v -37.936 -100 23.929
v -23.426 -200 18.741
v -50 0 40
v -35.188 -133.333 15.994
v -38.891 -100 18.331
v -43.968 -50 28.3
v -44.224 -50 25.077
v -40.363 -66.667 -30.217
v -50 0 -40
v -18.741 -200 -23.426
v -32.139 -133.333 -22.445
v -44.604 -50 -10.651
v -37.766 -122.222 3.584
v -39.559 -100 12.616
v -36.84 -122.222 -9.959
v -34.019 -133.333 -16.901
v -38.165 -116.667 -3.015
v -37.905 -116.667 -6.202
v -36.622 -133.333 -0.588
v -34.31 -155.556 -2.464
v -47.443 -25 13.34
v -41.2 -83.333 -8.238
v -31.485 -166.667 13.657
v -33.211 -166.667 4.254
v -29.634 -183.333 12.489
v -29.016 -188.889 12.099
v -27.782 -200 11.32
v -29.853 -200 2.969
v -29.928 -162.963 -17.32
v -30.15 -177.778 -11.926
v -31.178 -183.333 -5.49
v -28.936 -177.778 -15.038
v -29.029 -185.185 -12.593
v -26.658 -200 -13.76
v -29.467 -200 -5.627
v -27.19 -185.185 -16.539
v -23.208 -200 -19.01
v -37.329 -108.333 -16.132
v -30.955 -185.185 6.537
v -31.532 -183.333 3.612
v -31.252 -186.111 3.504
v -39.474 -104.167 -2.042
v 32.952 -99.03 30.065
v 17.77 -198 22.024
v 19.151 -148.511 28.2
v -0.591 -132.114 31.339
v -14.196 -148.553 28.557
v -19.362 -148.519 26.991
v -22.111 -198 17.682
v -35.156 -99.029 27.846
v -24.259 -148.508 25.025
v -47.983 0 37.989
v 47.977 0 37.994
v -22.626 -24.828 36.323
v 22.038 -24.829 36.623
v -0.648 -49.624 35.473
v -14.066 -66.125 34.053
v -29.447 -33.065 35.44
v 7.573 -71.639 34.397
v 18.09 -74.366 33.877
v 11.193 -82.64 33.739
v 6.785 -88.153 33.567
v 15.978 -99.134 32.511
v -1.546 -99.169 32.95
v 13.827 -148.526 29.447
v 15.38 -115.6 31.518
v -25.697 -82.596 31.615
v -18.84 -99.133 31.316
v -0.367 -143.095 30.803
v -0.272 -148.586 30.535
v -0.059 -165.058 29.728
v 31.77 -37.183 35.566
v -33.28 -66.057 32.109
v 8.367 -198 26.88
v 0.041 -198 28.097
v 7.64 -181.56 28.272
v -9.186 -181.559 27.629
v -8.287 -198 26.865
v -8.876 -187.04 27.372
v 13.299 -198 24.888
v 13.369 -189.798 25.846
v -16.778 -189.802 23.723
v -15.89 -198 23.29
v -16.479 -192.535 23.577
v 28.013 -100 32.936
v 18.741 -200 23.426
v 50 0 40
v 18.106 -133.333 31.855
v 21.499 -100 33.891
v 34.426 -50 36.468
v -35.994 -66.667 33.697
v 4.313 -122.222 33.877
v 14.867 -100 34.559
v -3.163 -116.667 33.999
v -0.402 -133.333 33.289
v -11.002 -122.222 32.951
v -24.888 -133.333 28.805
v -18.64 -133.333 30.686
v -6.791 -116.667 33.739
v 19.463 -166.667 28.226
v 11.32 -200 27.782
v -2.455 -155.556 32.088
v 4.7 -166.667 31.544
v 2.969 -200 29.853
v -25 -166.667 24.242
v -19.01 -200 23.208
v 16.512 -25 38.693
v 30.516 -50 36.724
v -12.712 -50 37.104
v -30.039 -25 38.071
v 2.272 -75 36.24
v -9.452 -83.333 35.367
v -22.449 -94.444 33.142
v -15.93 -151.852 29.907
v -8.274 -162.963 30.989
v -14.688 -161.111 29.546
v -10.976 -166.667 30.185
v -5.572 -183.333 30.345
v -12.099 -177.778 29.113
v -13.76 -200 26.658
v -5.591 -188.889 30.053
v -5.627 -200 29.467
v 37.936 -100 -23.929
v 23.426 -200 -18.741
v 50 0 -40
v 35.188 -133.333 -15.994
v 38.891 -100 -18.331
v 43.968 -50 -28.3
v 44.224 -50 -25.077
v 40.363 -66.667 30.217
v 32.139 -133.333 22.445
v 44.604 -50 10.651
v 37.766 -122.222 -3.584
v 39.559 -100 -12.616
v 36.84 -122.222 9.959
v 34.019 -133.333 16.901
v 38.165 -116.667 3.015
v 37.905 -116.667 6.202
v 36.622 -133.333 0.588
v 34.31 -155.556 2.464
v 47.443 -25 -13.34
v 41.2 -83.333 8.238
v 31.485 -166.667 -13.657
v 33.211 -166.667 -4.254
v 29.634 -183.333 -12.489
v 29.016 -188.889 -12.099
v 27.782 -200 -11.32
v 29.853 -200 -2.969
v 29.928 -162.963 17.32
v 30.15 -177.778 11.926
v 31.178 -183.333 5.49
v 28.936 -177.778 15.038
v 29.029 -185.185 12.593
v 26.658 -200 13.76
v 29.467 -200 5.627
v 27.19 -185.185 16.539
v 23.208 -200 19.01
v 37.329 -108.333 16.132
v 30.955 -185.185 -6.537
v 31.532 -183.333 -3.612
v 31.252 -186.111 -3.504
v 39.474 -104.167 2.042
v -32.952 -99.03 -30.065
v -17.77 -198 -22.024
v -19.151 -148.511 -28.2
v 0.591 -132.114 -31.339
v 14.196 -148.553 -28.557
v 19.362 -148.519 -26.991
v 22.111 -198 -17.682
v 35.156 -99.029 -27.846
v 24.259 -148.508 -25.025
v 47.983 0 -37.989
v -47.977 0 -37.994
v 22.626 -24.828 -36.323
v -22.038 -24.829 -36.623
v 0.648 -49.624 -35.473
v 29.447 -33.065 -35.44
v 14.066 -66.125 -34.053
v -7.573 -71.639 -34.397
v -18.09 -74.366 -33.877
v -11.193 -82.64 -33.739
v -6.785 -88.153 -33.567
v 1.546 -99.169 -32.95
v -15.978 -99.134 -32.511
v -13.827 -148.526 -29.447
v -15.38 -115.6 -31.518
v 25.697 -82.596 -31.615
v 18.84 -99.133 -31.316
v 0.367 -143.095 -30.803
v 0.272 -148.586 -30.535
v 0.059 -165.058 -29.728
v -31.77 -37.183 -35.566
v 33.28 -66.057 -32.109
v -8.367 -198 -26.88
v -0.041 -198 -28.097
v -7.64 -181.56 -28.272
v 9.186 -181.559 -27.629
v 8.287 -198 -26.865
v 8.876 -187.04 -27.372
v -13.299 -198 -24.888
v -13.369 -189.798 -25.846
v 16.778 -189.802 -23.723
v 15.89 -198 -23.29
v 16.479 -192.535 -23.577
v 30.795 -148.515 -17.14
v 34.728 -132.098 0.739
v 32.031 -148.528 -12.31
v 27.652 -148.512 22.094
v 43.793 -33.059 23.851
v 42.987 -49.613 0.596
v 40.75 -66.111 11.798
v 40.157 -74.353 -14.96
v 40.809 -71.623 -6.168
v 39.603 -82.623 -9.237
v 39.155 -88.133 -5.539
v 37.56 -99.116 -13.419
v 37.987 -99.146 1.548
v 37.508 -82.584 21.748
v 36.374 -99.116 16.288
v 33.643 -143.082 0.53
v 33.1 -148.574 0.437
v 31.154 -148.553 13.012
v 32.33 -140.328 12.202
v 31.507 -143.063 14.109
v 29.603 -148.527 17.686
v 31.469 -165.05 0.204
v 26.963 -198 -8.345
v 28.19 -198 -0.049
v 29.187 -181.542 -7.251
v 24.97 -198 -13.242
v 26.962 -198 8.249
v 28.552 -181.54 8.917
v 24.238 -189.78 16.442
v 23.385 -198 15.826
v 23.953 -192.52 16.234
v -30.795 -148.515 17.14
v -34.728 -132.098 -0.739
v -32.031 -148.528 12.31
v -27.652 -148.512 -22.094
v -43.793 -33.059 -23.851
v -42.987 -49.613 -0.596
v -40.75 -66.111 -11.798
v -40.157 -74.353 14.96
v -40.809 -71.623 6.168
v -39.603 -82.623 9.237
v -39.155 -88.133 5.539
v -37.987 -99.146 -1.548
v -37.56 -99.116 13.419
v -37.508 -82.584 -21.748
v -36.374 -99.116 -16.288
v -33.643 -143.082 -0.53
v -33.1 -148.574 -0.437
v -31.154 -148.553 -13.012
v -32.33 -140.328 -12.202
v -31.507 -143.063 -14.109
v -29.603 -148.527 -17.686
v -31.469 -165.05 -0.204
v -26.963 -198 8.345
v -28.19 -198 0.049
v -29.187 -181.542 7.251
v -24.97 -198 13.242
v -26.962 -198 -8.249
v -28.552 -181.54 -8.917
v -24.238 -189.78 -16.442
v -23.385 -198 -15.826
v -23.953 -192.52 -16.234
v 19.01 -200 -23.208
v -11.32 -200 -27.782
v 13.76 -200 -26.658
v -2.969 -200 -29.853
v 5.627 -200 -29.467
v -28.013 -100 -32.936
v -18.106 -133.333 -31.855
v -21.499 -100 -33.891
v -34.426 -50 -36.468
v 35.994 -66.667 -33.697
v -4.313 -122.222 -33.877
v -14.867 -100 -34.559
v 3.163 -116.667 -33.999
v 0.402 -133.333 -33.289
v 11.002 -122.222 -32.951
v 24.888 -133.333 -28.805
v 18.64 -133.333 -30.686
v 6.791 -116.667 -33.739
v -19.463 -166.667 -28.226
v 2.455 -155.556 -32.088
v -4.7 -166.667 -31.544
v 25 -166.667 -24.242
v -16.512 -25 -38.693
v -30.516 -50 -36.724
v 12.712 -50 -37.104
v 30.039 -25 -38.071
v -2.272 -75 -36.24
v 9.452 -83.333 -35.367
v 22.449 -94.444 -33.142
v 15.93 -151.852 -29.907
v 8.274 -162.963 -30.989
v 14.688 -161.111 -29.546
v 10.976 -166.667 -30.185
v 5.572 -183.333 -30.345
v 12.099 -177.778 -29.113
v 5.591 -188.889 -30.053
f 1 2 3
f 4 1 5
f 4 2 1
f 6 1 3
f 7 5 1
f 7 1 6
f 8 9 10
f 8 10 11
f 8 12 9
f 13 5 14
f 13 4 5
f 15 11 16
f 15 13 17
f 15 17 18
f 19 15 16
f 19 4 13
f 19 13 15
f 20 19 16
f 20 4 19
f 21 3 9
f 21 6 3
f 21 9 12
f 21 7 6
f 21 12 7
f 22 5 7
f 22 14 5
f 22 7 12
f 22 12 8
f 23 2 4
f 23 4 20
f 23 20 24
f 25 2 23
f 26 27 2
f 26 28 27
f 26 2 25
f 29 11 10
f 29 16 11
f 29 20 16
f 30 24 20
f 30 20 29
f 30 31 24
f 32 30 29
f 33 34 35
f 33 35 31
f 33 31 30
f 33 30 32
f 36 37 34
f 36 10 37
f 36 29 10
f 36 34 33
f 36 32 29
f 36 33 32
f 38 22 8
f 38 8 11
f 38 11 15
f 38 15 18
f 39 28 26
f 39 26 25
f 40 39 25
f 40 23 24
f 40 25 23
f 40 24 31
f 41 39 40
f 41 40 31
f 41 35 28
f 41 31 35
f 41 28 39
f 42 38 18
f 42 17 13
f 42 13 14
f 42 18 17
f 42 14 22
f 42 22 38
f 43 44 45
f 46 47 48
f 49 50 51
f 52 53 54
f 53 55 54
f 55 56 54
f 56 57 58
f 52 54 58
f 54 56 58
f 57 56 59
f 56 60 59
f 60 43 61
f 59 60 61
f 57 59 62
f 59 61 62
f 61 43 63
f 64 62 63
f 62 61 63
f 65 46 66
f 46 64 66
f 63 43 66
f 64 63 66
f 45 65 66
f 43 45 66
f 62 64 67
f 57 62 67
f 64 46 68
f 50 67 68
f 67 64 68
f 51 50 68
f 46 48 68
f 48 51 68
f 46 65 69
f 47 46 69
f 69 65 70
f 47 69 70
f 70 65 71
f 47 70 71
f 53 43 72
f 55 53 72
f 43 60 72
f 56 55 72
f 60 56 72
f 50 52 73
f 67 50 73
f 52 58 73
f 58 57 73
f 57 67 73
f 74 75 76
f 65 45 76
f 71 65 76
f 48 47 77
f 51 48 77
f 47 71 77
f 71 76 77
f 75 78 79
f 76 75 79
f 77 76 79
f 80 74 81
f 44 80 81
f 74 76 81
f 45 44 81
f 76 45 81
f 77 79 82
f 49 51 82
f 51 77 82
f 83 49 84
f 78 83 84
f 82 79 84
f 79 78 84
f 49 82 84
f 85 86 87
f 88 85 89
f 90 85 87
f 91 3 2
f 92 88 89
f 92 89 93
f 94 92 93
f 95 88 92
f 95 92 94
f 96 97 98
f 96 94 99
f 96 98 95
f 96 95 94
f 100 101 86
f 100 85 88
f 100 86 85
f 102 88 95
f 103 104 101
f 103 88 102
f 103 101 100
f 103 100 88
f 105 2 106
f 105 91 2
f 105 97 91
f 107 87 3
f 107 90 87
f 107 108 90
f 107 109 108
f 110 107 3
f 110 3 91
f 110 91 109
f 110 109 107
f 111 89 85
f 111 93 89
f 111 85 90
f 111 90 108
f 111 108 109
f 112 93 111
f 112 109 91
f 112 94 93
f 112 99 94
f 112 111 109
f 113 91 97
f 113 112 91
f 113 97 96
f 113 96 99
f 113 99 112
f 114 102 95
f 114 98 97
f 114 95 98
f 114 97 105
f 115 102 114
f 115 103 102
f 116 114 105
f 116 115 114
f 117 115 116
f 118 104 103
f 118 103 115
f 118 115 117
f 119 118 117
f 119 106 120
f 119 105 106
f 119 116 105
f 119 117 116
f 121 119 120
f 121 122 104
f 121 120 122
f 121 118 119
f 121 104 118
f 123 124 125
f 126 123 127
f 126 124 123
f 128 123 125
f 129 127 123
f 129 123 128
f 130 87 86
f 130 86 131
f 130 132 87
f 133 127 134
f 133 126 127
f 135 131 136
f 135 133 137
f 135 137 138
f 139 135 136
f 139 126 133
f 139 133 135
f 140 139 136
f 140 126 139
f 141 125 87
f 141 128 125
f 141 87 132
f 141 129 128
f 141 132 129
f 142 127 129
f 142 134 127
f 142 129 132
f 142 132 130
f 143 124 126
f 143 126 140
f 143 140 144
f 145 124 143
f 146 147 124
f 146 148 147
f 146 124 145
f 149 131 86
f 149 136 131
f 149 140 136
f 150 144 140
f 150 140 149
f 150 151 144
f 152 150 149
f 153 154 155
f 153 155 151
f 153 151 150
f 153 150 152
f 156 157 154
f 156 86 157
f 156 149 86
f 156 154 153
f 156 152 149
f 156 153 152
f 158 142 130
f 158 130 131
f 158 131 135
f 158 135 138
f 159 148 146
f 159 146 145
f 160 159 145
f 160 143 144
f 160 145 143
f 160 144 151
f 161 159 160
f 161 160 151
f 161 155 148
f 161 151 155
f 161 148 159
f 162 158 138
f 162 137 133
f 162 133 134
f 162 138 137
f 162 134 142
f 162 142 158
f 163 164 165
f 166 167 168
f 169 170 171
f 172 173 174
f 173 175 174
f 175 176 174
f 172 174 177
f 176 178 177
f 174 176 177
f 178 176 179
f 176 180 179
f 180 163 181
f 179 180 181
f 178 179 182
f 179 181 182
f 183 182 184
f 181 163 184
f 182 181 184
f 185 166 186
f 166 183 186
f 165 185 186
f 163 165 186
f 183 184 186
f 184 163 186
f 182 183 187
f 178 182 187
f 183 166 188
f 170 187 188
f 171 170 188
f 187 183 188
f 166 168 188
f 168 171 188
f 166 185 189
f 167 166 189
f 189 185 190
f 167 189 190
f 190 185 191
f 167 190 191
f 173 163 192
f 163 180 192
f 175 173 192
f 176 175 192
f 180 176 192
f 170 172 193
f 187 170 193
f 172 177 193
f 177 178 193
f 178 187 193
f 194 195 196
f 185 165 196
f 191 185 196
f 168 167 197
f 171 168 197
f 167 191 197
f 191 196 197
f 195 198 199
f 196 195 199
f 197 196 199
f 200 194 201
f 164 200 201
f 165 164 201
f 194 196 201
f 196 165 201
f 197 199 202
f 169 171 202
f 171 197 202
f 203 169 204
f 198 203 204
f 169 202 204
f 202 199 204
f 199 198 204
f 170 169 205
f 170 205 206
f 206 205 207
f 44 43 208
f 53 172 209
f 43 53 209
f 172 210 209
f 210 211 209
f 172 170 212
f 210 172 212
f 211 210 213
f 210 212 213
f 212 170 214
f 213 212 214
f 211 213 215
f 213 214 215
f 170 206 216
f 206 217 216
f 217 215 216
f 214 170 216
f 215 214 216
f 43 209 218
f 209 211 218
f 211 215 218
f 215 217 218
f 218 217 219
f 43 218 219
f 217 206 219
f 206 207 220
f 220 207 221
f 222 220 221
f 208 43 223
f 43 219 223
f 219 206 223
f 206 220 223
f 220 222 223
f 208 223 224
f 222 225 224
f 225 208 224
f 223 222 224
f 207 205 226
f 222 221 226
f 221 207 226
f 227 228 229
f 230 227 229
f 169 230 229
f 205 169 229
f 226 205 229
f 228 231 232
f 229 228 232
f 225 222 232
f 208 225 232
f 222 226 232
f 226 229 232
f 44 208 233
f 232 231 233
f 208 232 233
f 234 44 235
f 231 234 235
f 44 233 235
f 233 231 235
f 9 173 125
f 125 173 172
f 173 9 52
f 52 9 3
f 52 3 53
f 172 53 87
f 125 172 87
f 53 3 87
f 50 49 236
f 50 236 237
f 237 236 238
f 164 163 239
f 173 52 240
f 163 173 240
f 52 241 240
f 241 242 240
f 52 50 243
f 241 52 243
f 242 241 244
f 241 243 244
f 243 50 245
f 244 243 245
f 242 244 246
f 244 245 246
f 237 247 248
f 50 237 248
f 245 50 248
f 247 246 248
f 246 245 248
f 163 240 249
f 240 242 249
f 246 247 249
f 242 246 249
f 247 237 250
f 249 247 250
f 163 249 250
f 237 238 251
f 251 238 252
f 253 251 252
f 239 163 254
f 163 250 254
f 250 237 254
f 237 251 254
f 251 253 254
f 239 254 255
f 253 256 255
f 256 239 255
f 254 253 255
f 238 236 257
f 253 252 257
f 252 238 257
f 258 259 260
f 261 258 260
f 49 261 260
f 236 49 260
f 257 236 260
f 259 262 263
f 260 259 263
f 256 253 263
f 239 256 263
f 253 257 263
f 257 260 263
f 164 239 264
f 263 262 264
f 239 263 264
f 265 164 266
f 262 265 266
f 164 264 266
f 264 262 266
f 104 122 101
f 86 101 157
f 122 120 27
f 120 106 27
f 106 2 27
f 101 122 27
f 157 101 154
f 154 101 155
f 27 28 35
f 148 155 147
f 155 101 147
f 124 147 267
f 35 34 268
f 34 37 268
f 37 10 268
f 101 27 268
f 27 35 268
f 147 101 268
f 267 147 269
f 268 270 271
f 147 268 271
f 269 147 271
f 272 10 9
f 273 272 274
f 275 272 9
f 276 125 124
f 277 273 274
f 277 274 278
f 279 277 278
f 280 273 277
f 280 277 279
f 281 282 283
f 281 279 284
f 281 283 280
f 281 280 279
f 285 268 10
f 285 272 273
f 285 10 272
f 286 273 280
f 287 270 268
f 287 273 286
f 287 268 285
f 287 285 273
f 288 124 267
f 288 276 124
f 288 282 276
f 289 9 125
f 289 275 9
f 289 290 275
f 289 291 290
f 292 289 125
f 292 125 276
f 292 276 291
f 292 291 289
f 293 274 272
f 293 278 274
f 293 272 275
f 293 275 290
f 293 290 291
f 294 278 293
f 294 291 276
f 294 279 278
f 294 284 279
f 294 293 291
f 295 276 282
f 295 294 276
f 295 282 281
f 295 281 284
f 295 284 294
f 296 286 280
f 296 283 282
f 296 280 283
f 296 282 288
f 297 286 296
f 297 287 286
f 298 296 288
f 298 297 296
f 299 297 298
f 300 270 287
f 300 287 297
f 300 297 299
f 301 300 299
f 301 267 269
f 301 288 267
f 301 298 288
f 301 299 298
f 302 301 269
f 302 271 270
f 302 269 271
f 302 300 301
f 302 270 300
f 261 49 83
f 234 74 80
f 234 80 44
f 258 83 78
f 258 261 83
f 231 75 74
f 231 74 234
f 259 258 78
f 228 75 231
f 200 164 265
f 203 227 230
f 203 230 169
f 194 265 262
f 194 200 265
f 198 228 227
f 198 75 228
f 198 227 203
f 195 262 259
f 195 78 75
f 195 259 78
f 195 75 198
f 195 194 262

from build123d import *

# Parameters (mm, degrees)
F0_W = 100
F0_H = 80
F4_T = 2


# Not quite as in the source:
# - the arcs of a loft's sections are written as splines that run evenly, so that the points pair up as in the source's solid
# - a shell that OpenCascade refuses in one call is made with other operations: the cavity is built on its own and cut out


with BuildPart() as f3:
    # F0 (on Front) → F3 section 0
    with BuildSketch(Plane.XZ):
        Rectangle(F0_W, F0_H)
    # F2 (on offset) → F3 section 1
    with BuildSketch(Plane.XZ.offset(200)):
        with BuildLine():
            add(Edge.make_bspline(
                [(23.4260642833, -18.7408514266), (24.6526501409, -17.2076191047), (25.7281991997, -15.5536195196), (27.5359963334, -12.0674860741), (28.2681997069, -10.2354384151), (29.3611496291, -6.4636063212), (29.7218691524, -4.5239151524), (30.0579704105, -0.6113338023), (30.0333438346, 1.3614596326), (29.5996802458, 5.2644319319), (29.1906539561, 7.1945142875), (28.0038909689, 10.9378884992), (27.2261836164, 12.751087793), (25.3319278668, 16.1910081455), (24.215426309, 17.8176441455), (21.6864729832, 20.8219164288), (20.2740837486, 22.1994784257), (18.7408514266, 23.4260642833)],
                knots=[0, 0, 0, 0, 0.125, 0.125, 0.25, 0.25, 0.375, 0.375, 0.5, 0.5, 0.625, 0.625, 0.75, 0.75, 0.875, 0.875, 1, 1, 1, 1], degree=3))
            add(Edge.make_bspline(
                [(18.7408514266, 23.4260642833), (17.2076191047, 24.6526501409), (15.5536195196, 25.7281991997), (12.0674860741, 27.5359963334), (10.2354384151, 28.2681997069), (6.4636063212, 29.3611496291), (4.5239151524, 29.7218691524), (0.6113338023, 30.0579704105), (-1.3614596326, 30.0333438346), (-5.2644319319, 29.5996802458), (-7.1945142875, 29.1906539561), (-10.9378884992, 28.0038909689), (-12.751087793, 27.2261836164), (-16.1910081455, 25.3319278668), (-17.8176441455, 24.215426309), (-20.8219164288, 21.6864729832), (-22.1994784257, 20.2740837486), (-23.4260642833, 18.7408514266)],
                knots=[0, 0, 0, 0, 0.125, 0.125, 0.25, 0.25, 0.375, 0.375, 0.5, 0.5, 0.625, 0.625, 0.75, 0.75, 0.875, 0.875, 1, 1, 1, 1], degree=3))
            add(Edge.make_bspline(
                [(-23.4260642833, 18.7408514266), (-24.6526501409, 17.2076191047), (-25.7281991997, 15.5536195196), (-27.5359963334, 12.0674860741), (-28.2681997069, 10.2354384151), (-29.3611496291, 6.4636063212), (-29.7218691524, 4.5239151524), (-30.0579704105, 0.6113338023), (-30.0333438346, -1.3614596326), (-29.5996802458, -5.2644319319), (-29.1906539561, -7.1945142875), (-28.0038909689, -10.9378884992), (-27.2261836164, -12.751087793), (-25.3319278668, -16.1910081455), (-24.215426309, -17.8176441455), (-21.6864729832, -20.8219164288), (-20.2740837486, -22.1994784257), (-18.7408514266, -23.4260642833)],
                knots=[0, 0, 0, 0, 0.125, 0.125, 0.25, 0.25, 0.375, 0.375, 0.5, 0.5, 0.625, 0.625, 0.75, 0.75, 0.875, 0.875, 1, 1, 1, 1], degree=3))
            add(Edge.make_bspline(
                [(-18.7408514266, -23.4260642833), (-17.2076191047, -24.6526501409), (-15.5536195196, -25.7281991997), (-12.0674860741, -27.5359963334), (-10.2354384151, -28.2681997069), (-6.4636063212, -29.3611496291), (-4.5239151524, -29.7218691524), (-0.6113338023, -30.0579704105), (1.3614596326, -30.0333438346), (5.2644319319, -29.5996802458), (7.1945142875, -29.1906539561), (10.9378884992, -28.0038909689), (12.751087793, -27.2261836164), (16.1910081455, -25.3319278668), (17.8176441455, -24.215426309), (20.8219164288, -21.6864729832), (22.1994784257, -20.2740837486), (23.4260642833, -18.7408514266)],
                knots=[0, 0, 0, 0, 0.125, 0.125, 0.25, 0.25, 0.375, 0.375, 0.5, 0.5, 0.625, 0.625, 0.75, 0.75, 0.875, 0.875, 1, 1, 1, 1], degree=3))
        make_face()
    loft(ruled=True)

    # F4: shell of thickness 2, made by hand


with BuildPart() as f4_core1:
    # F4_t2: copy of F3
    add(f3.part)

    # the walls: a layer under each face that stays
    f4_faces = [f4_core1.faces().sort_by_distance(p)[0] for p in [
        (1.6564728911, -100, -34.9082560201),
        (39.9082560201, -100, 1.6564728911),
        (-1.6564728911, -100, 34.9082560201),
        (-39.9082560201, -100, -1.6564728911),
        (0, -200, 0),
    ]]
    thicken(f4_faces, amount=-F4_T, mode=Mode.SUBTRACT)


with BuildPart() as f3_1:
    add(f3.part)

    # what is left inside the walls is the cavity
    f4_cavity = [f4_core1.part.solids().sort_by_distance(p)[0] for p in [
        (-1.053831, -66.075437, 34.613436),
    ]]
    add(f4_cavity, mode=Mode.SUBTRACT)


solid = f3_1.part
